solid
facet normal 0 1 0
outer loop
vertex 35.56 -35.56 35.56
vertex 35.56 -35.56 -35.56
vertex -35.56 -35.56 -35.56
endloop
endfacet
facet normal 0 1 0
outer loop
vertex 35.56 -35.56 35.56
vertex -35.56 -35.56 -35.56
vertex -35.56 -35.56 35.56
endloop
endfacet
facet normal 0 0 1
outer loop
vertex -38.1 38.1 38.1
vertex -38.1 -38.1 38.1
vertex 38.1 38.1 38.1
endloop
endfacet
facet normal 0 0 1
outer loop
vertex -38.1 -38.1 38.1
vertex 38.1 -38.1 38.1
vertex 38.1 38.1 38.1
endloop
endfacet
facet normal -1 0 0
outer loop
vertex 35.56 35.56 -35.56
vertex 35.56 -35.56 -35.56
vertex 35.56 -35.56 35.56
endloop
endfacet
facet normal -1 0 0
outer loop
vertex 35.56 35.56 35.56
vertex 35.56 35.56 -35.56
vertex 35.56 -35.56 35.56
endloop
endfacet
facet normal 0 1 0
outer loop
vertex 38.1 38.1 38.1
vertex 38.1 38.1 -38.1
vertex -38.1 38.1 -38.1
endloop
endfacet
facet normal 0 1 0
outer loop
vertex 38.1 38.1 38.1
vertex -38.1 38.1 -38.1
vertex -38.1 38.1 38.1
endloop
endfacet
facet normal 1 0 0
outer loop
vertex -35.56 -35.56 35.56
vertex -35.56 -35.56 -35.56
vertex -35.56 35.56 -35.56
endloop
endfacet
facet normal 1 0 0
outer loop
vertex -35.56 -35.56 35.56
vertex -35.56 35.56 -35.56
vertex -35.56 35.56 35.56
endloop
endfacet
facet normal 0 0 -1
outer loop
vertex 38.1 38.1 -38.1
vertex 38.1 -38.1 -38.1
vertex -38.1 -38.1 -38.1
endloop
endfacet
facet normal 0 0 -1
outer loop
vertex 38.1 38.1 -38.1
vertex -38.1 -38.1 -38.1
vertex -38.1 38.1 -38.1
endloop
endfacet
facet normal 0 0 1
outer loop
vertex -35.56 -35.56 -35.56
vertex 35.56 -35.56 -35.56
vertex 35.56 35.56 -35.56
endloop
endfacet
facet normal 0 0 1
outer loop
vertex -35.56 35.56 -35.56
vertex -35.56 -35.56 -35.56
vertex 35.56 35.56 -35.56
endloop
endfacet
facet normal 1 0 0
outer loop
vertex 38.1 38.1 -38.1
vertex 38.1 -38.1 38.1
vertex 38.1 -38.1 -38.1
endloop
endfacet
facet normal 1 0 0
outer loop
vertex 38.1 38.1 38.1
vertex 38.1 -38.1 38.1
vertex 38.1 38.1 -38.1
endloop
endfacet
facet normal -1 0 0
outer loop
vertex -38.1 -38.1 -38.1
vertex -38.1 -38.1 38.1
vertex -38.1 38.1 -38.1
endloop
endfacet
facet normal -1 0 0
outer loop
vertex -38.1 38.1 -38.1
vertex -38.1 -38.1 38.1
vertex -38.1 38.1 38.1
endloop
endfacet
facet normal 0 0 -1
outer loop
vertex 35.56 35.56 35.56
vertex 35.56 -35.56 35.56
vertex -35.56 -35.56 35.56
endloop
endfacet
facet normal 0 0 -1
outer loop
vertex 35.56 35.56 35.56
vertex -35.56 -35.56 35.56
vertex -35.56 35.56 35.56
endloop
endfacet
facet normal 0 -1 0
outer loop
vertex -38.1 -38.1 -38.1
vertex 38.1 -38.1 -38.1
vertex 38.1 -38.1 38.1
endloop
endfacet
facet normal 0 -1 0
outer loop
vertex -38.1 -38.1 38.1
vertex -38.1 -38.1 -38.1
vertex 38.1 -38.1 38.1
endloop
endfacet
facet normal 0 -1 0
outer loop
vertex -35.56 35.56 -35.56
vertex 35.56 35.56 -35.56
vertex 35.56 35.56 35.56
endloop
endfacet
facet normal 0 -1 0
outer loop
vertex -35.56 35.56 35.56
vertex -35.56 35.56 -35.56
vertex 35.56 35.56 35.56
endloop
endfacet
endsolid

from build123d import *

# Parameters (mm, degrees)
F3_W     = 76.2
F3_H     = 76.2
F3_W_2   = 71.12
F3_H_2   = 71.12
F4_DEPTH = 38.1
F2_W     = 76.2
F2_H     = 76.2
F2_W_2   = 71.12
F2_H_2   = 71.12
F5_DEPTH = 38.1


# Not quite as in the source:
# - a variable given as a bare number and used for a length is read in inches; the dataset says mm whatever the document's units were


with BuildPart() as f4:
    # F3 (on Right) → F4 (new body, symmetric)
    with BuildSketch(Plane.YZ):
        Rectangle(F3_W, F3_H)
        Rectangle(F3_W_2, F3_H_2, mode=Mode.SUBTRACT)
    extrude(amount=F4_DEPTH, both=True)

    # F2 (on Front) → F5 (join, symmetric)
    with BuildSketch(Plane.XZ):
        Rectangle(F2_W, F2_H)
        Rectangle(F2_W_2, F2_H_2, mode=Mode.SUBTRACT)
    extrude(amount=F5_DEPTH, both=True)


solid = f4.part
